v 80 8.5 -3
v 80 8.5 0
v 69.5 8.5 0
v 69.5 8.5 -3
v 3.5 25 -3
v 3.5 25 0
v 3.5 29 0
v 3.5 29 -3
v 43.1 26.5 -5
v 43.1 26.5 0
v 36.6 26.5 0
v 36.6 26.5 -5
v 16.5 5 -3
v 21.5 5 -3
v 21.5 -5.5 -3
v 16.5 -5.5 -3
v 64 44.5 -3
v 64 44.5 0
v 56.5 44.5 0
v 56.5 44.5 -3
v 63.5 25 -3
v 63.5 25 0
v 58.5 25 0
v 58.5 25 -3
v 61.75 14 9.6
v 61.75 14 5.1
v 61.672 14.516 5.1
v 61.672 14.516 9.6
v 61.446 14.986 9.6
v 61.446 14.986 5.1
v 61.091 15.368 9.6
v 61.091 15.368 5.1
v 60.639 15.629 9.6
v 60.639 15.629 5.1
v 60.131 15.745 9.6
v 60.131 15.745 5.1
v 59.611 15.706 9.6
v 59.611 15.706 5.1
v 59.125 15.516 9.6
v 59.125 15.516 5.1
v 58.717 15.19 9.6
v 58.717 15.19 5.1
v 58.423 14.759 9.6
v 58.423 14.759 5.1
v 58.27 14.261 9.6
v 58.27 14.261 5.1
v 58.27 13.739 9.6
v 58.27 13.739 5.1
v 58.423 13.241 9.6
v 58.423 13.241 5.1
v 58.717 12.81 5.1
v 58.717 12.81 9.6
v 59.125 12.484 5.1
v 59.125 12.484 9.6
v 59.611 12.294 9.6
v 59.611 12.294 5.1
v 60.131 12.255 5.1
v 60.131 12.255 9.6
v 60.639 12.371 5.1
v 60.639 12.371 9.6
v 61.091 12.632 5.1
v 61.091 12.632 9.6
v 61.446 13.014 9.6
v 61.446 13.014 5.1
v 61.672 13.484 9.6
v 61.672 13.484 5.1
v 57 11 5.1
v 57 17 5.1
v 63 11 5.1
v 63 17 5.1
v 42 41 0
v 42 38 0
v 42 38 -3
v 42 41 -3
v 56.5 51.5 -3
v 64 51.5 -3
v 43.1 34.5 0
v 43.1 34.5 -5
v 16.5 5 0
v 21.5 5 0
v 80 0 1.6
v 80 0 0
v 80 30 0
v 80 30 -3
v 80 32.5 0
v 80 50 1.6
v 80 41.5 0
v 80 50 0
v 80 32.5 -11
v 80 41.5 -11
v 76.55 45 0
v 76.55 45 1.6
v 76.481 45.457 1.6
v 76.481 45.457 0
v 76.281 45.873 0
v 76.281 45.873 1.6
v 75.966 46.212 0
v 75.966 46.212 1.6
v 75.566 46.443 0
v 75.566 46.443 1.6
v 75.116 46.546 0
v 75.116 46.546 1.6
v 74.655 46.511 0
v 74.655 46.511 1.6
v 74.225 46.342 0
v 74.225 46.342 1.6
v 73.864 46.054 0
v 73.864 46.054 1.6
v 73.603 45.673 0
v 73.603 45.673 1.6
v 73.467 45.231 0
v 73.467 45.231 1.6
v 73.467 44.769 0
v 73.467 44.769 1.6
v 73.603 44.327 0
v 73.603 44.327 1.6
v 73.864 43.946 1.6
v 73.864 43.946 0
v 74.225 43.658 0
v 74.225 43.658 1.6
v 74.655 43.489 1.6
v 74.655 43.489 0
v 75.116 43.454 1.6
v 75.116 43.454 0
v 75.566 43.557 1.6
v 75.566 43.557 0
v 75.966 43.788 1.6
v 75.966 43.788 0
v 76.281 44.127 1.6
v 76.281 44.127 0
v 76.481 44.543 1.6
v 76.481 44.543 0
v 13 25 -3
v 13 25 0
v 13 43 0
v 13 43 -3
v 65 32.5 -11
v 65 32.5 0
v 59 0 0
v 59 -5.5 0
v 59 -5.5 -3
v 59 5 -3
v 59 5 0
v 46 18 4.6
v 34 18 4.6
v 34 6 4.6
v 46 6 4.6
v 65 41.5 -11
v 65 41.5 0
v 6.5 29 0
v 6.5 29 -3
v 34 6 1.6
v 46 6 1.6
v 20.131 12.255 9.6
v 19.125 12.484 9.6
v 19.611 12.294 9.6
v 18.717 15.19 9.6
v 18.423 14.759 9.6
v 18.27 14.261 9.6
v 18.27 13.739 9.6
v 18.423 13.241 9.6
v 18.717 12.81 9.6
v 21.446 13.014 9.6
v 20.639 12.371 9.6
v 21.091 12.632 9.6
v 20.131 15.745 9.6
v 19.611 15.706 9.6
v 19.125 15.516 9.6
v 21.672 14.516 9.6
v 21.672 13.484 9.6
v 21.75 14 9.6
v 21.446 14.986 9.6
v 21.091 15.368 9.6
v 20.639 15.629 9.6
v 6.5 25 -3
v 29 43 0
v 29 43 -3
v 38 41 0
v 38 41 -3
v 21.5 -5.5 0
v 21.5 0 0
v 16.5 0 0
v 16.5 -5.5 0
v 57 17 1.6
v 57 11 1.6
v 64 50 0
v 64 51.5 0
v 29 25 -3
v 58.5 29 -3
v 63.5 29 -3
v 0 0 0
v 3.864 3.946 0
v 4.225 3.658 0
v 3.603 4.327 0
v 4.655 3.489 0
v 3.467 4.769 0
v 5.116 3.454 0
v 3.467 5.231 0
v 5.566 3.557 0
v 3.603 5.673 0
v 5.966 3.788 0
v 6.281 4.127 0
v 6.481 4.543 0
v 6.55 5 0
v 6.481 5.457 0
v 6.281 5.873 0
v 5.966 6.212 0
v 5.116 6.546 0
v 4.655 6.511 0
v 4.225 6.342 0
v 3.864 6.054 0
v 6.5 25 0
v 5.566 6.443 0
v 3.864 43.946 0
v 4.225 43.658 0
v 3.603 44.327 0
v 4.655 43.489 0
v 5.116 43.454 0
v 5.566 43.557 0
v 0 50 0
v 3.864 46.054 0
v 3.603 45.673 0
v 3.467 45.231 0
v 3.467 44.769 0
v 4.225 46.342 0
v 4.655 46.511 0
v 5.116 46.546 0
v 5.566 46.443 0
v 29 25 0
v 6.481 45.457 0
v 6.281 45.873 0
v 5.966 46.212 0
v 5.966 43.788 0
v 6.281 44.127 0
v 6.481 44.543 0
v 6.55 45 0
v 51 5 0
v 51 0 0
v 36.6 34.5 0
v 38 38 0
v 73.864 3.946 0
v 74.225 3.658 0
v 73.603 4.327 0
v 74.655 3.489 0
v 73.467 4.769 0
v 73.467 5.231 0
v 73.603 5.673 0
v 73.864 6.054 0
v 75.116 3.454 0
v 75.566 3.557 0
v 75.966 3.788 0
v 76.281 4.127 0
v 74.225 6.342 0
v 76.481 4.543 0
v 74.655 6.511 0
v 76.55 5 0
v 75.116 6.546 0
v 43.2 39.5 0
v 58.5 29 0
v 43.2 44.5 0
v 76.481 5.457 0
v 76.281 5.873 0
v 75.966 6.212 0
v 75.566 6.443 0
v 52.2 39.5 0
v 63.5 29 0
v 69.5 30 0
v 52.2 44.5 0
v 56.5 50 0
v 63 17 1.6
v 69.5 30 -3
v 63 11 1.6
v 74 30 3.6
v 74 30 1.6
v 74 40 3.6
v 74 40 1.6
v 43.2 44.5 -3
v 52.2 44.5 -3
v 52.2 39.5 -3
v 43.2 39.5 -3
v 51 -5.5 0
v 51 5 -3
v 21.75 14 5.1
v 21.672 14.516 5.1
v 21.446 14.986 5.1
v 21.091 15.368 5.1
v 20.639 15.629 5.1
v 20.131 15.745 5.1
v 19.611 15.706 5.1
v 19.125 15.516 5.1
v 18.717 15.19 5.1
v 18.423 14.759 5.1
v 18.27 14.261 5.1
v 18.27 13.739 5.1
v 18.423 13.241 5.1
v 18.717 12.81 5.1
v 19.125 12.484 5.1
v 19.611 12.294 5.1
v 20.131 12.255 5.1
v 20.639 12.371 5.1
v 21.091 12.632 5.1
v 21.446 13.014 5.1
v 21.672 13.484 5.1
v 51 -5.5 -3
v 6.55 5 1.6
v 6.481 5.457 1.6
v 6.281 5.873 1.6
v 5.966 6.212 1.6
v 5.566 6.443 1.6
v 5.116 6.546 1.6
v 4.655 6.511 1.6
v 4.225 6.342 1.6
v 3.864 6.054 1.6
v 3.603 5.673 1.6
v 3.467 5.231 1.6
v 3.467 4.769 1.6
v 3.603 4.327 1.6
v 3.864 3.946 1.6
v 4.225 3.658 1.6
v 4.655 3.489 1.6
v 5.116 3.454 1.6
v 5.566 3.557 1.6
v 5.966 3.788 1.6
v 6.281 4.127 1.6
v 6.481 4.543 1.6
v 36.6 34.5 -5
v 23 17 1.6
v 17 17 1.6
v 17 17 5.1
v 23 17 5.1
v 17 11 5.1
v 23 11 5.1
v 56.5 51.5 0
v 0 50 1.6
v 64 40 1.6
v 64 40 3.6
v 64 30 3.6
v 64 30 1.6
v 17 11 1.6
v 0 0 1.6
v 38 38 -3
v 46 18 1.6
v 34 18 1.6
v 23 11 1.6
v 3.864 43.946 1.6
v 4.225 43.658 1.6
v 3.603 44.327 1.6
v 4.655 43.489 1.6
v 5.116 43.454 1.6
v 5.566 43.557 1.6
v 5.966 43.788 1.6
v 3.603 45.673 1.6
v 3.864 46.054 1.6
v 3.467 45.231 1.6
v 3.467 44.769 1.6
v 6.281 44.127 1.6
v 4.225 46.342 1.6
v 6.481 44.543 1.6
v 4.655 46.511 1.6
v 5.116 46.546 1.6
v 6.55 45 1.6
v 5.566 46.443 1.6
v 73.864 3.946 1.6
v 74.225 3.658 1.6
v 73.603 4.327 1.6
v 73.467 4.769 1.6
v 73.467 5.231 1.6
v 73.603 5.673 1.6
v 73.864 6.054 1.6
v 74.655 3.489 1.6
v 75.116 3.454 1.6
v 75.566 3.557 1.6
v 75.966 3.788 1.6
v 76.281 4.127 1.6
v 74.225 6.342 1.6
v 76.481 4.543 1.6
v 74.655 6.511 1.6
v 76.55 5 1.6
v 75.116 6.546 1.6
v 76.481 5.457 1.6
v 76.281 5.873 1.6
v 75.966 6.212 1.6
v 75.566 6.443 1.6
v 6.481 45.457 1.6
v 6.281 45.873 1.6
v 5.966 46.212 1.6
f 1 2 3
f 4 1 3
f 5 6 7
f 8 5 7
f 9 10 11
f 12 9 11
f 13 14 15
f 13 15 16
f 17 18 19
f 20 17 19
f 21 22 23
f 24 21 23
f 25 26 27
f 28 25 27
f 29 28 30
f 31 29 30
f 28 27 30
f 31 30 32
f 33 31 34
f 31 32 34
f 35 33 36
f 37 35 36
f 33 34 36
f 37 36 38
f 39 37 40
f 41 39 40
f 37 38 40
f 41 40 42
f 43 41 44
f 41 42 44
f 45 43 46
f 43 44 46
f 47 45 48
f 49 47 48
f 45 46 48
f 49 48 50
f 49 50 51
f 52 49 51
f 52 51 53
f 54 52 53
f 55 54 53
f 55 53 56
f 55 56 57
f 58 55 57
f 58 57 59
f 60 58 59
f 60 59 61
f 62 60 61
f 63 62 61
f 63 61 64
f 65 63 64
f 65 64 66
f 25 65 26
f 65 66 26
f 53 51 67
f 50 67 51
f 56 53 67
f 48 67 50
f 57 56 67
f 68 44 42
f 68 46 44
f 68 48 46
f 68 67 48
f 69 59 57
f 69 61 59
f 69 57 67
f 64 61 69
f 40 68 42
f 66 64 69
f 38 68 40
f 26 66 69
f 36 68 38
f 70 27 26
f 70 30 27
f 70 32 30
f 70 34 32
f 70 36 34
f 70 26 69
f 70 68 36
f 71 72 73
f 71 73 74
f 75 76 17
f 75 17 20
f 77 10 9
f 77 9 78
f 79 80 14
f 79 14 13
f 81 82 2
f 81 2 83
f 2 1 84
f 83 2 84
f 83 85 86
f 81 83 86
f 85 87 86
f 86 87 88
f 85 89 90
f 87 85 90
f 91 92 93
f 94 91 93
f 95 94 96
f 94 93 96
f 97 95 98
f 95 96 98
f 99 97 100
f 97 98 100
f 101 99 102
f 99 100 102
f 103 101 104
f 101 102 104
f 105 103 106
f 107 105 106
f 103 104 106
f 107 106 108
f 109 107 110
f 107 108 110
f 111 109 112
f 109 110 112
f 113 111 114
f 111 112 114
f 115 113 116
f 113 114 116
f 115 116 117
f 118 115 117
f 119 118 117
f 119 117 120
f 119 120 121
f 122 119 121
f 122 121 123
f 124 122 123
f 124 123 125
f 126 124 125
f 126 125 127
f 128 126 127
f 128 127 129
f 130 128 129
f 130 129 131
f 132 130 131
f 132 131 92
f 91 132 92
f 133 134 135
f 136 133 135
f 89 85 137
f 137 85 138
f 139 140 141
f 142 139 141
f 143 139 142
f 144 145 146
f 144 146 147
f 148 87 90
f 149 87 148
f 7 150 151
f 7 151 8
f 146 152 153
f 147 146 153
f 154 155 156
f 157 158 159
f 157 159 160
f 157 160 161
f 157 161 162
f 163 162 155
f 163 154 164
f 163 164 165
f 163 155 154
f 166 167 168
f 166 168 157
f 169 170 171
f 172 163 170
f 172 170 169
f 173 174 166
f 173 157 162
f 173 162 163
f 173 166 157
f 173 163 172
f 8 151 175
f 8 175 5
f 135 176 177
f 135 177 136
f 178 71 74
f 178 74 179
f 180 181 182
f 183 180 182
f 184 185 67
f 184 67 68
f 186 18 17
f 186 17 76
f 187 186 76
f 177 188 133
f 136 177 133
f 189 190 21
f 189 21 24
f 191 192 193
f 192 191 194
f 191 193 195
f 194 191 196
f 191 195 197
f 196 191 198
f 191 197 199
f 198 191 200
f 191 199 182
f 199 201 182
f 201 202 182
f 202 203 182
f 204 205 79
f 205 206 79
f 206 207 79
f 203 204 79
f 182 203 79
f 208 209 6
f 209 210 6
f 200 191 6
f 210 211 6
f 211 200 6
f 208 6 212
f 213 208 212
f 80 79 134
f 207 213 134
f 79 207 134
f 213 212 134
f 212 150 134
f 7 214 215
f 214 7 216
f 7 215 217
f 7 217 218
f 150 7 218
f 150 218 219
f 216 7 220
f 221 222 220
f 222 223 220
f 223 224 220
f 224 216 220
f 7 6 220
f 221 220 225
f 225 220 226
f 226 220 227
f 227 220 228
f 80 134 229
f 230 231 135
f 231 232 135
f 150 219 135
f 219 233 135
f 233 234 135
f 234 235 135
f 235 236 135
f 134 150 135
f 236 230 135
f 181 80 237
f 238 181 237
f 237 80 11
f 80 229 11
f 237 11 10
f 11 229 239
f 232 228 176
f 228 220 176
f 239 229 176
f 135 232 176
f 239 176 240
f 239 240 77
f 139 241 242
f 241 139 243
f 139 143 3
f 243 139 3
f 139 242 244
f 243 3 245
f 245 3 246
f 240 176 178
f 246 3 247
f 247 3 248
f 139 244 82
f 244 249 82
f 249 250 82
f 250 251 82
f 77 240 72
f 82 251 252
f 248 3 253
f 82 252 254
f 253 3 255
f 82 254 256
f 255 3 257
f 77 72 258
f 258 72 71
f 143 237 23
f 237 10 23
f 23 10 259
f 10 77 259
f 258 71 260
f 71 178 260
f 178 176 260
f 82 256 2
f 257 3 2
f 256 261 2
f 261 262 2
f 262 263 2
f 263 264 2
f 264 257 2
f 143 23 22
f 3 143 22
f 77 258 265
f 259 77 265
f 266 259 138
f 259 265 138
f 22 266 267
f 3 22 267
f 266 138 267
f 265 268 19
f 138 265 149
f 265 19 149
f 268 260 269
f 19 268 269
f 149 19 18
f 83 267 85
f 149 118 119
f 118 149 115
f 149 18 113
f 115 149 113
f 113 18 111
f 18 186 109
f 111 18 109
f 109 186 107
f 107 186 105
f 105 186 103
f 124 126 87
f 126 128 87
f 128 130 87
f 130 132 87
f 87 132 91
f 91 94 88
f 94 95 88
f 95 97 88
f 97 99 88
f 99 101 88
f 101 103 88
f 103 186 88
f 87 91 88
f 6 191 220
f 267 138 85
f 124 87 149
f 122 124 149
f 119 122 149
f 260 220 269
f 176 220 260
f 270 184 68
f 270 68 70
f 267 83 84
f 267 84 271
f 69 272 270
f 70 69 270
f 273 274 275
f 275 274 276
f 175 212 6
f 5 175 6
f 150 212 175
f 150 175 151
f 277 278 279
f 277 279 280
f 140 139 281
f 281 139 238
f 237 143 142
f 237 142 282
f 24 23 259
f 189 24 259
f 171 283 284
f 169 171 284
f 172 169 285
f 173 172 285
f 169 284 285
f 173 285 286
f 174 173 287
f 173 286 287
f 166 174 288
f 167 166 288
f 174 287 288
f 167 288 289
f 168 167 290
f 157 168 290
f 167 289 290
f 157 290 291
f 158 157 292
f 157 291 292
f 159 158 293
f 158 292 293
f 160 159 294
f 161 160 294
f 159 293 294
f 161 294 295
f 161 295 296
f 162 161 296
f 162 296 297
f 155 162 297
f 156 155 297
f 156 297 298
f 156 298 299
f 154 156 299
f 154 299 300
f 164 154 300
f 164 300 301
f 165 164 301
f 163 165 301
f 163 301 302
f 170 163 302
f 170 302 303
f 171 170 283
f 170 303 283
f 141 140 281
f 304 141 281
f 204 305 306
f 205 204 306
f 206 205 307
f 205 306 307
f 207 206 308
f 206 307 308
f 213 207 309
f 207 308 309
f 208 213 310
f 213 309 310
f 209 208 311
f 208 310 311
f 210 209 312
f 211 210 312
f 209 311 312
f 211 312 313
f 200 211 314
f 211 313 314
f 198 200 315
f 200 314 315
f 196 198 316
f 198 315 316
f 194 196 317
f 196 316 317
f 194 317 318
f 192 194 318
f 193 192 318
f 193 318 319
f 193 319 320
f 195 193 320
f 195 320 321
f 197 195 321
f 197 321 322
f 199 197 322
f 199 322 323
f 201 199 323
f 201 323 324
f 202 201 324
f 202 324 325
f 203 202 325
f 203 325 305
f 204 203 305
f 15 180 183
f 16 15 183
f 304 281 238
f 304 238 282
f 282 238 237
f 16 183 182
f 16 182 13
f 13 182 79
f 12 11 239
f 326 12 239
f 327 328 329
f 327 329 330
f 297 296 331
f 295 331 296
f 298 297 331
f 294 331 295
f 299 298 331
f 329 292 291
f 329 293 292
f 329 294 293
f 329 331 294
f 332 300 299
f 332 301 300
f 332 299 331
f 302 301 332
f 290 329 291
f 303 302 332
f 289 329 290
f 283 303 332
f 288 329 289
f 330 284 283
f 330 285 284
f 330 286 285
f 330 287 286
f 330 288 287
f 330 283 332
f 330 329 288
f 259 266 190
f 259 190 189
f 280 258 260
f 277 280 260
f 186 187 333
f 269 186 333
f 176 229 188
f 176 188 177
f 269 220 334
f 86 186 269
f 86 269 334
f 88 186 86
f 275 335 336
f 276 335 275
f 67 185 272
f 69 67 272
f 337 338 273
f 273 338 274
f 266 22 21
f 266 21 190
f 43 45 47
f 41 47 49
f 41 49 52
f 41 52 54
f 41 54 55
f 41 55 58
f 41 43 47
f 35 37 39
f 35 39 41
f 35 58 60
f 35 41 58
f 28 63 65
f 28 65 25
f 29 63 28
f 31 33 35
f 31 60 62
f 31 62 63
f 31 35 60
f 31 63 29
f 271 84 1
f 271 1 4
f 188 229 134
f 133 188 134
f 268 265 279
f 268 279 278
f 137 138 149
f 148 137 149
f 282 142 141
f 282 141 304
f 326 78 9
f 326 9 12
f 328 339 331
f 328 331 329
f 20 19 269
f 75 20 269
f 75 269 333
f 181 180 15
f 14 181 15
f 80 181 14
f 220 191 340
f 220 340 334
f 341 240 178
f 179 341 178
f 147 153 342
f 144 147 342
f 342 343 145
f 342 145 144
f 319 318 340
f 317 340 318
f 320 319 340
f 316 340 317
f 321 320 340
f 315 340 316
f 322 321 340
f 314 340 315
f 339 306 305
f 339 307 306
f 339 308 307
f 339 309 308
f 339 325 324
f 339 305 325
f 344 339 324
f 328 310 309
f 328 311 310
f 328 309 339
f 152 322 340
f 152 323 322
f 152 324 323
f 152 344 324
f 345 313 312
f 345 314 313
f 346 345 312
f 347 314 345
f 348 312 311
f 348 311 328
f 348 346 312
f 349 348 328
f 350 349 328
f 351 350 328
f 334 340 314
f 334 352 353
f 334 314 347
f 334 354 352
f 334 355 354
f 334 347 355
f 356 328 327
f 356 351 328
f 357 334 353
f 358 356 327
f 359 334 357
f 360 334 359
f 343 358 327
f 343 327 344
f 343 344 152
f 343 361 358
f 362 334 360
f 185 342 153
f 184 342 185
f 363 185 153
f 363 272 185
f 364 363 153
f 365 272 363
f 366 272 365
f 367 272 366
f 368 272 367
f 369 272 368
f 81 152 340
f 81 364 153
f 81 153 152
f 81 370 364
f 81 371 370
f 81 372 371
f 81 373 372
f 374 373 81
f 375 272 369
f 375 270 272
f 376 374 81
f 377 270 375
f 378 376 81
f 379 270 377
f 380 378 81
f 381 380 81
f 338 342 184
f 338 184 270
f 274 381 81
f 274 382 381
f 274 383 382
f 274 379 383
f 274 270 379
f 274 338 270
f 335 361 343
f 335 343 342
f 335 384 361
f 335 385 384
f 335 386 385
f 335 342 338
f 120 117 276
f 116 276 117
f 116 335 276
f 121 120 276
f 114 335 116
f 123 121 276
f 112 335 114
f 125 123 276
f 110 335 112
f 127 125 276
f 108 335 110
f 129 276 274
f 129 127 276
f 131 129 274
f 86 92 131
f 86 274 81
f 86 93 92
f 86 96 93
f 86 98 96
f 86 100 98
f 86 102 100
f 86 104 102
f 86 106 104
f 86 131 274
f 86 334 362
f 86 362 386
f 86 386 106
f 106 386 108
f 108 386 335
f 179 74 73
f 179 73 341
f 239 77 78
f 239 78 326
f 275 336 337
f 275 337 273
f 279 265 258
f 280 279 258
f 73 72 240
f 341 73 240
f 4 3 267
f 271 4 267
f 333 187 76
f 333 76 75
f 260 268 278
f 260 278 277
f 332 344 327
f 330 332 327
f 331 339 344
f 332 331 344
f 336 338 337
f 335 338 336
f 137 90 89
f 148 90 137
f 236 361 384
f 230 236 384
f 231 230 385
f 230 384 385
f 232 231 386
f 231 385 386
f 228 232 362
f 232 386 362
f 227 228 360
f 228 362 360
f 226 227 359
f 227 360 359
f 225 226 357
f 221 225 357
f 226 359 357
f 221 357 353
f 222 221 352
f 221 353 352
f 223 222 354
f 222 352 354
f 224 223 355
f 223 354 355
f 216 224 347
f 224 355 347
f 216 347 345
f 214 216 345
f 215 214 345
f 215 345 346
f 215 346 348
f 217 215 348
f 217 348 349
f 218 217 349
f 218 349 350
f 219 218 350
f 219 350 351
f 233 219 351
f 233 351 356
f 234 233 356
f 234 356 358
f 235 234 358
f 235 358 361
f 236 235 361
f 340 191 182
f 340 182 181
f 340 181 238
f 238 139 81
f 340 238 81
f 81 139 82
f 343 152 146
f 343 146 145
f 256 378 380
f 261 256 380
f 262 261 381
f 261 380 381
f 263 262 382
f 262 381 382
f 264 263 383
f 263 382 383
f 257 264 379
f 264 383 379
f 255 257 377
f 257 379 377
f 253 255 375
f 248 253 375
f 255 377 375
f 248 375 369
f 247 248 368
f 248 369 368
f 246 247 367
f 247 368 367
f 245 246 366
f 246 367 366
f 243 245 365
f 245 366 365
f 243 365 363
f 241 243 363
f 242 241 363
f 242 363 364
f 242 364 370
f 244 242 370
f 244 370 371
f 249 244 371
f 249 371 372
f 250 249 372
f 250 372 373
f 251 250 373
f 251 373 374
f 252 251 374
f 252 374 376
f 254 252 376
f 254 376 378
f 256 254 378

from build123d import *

# Parameters (mm, degrees)
SKETCH_1_W          = 80
SKETCH_1_H          = 50
EXTRUDE_1_DEPTH     = 1.6
SKETCH_2_R          = 1.55
CUT_EXTRUDE_1_DEPTH = 2.6
SKETCH_3_W          = 6
SKETCH_3_H          = 6
EXTRUDE_2_DEPTH     = 3.5
SKETCH_4_R          = 1.75
EXTRUDE_3_DEPTH     = 4.5
SKETCH_5_W          = 12
SKETCH_5_H          = 12
EXTRUDE_4_DEPTH     = 3
SKETCH_6_W          = 10
SKETCH_6_H          = 10
EXTRUDE_5_DEPTH     = 2
SKETCH_7_W          = 16
SKETCH_7_H          = 18
SKETCH_7_W_2        = 3
SKETCH_7_H_2        = 4
SKETCH_7_W_3        = 5
SKETCH_7_H_3        = 10.5
SKETCH_7_W_4        = 8
SKETCH_7_W_5        = 10.5
SKETCH_7_H_4        = 21.5
SKETCH_7_W_6        = 7.5
SKETCH_7_H_5        = 7
SKETCH_7_W_7        = 9
SKETCH_7_H_6        = 5
SKETCH_7_W_8        = 4
SKETCH_7_H_7        = 3
EXTRUDE_6_DEPTH     = 3
SKETCH_8_W          = 6.5
SKETCH_8_H          = 8
EXTRUDE_7_DEPTH     = 5
SKETCH_9_W          = 15
SKETCH_9_H          = 9
EXTRUDE_8_DEPTH     = 11


with BuildPart() as part:
    # ｽｹｯﾁ1 → ﾎﾞｽ - 押し出し1 (new body)
    with BuildSketch(Plane.XY):
        with Locations((40, 25)):
            Rectangle(SKETCH_1_W, SKETCH_1_H)
    extrude(amount=EXTRUDE_1_DEPTH)

    # ｽｹｯﾁ2 → ｶｯﾄ - 押し出し1 (cut, through all)
    with BuildSketch(Plane.XY.offset(1.6)):
        with Locations((75, 45)):
            Circle(SKETCH_2_R)
        with Locations((75, 5)):
            Circle(SKETCH_2_R)
        with Locations((5, 5)):
            Circle(SKETCH_2_R)
        with Locations((5, 45)):
            Circle(SKETCH_2_R)
    extrude(amount=-CUT_EXTRUDE_1_DEPTH, mode=Mode.SUBTRACT)

    # ｽｹｯﾁ3 → ﾎﾞｽ - 押し出し2 (add)
    with BuildSketch(Plane.XY.offset(1.6)):
        with Locations((60, 14)):
            Rectangle(SKETCH_3_W, SKETCH_3_H)
        with Locations((20, 14)):
            Rectangle(SKETCH_3_W, SKETCH_3_H)
    extrude(amount=EXTRUDE_2_DEPTH)

    # ｽｹｯﾁ4 → ﾎﾞｽ - 押し出し3 (add)
    with BuildSketch(Plane.XY.offset(5.1)):
        with Locations((20, 14)):
            Circle(SKETCH_4_R)
        with Locations((60, 14)):
            Circle(SKETCH_4_R)
    extrude(amount=EXTRUDE_3_DEPTH)

    # ｽｹｯﾁ5 → ﾎﾞｽ - 押し出し4 (add)
    with BuildSketch(Plane.XY.offset(1.6)):
        with Locations((40, 12)):
            Rectangle(SKETCH_5_W, SKETCH_5_H)
    extrude(amount=EXTRUDE_4_DEPTH)

    # ｽｹｯﾁ6 → ﾎﾞｽ - 押し出し5 (add)
    with BuildSketch(Plane.XY.offset(1.6)):
        with Locations((69, 35)):
            Rectangle(SKETCH_6_W, SKETCH_6_H)
    extrude(amount=EXTRUDE_5_DEPTH)

    # ｽｹｯﾁ7 → ﾎﾞｽ - 押し出し6 (add)
    with BuildSketch(Plane(origin=(0, 0, 0), x_dir=(-1, 0, 0), z_dir=(0, 0, -1))):
        with Locations((-21, 34)):
            Rectangle(SKETCH_7_W, SKETCH_7_H)
        with Locations((-5, 27)):
            Rectangle(SKETCH_7_W_2, SKETCH_7_H_2)
        with Locations((-19, -0.25)):
            Rectangle(SKETCH_7_W_3, SKETCH_7_H_3)
        with Locations((-55, -0.25)):
            Rectangle(SKETCH_7_W_4, SKETCH_7_H_3)
        with Locations((-74.75, 19.25)):
            Rectangle(SKETCH_7_W_5, SKETCH_7_H_4)
        with Locations((-60.25, 48)):
            Rectangle(SKETCH_7_W_6, SKETCH_7_H_5)
        with Locations((-47.7, 42)):
            Rectangle(SKETCH_7_W_7, SKETCH_7_H_6)
        with Locations((-40, 39.5)):
            Rectangle(SKETCH_7_W_8, SKETCH_7_H_7)
        with Locations((-61, 27)):
            Rectangle(SKETCH_7_W_3, SKETCH_7_H_2)
    extrude(amount=EXTRUDE_6_DEPTH)

    # ｽｹｯﾁ8 → ﾎﾞｽ - 押し出し7 (add)
    with BuildSketch(Plane(origin=(0, 0, 0), x_dir=(-1, 0, 0), z_dir=(0, 0, -1))):
        with Locations((-39.85, 30.5)):
            Rectangle(SKETCH_8_W, SKETCH_8_H)
    extrude(amount=EXTRUDE_7_DEPTH)

    # ｽｹｯﾁ9 → ﾎﾞｽ - 押し出し8 (add)
    with BuildSketch(Plane(origin=(0, 0, 0), x_dir=(-1, 0, 0), z_dir=(0, 0, -1))):
        with Locations((-72.5, 37)):
            Rectangle(SKETCH_9_W, SKETCH_9_H)
    extrude(amount=EXTRUDE_8_DEPTH)


solid = part.part
